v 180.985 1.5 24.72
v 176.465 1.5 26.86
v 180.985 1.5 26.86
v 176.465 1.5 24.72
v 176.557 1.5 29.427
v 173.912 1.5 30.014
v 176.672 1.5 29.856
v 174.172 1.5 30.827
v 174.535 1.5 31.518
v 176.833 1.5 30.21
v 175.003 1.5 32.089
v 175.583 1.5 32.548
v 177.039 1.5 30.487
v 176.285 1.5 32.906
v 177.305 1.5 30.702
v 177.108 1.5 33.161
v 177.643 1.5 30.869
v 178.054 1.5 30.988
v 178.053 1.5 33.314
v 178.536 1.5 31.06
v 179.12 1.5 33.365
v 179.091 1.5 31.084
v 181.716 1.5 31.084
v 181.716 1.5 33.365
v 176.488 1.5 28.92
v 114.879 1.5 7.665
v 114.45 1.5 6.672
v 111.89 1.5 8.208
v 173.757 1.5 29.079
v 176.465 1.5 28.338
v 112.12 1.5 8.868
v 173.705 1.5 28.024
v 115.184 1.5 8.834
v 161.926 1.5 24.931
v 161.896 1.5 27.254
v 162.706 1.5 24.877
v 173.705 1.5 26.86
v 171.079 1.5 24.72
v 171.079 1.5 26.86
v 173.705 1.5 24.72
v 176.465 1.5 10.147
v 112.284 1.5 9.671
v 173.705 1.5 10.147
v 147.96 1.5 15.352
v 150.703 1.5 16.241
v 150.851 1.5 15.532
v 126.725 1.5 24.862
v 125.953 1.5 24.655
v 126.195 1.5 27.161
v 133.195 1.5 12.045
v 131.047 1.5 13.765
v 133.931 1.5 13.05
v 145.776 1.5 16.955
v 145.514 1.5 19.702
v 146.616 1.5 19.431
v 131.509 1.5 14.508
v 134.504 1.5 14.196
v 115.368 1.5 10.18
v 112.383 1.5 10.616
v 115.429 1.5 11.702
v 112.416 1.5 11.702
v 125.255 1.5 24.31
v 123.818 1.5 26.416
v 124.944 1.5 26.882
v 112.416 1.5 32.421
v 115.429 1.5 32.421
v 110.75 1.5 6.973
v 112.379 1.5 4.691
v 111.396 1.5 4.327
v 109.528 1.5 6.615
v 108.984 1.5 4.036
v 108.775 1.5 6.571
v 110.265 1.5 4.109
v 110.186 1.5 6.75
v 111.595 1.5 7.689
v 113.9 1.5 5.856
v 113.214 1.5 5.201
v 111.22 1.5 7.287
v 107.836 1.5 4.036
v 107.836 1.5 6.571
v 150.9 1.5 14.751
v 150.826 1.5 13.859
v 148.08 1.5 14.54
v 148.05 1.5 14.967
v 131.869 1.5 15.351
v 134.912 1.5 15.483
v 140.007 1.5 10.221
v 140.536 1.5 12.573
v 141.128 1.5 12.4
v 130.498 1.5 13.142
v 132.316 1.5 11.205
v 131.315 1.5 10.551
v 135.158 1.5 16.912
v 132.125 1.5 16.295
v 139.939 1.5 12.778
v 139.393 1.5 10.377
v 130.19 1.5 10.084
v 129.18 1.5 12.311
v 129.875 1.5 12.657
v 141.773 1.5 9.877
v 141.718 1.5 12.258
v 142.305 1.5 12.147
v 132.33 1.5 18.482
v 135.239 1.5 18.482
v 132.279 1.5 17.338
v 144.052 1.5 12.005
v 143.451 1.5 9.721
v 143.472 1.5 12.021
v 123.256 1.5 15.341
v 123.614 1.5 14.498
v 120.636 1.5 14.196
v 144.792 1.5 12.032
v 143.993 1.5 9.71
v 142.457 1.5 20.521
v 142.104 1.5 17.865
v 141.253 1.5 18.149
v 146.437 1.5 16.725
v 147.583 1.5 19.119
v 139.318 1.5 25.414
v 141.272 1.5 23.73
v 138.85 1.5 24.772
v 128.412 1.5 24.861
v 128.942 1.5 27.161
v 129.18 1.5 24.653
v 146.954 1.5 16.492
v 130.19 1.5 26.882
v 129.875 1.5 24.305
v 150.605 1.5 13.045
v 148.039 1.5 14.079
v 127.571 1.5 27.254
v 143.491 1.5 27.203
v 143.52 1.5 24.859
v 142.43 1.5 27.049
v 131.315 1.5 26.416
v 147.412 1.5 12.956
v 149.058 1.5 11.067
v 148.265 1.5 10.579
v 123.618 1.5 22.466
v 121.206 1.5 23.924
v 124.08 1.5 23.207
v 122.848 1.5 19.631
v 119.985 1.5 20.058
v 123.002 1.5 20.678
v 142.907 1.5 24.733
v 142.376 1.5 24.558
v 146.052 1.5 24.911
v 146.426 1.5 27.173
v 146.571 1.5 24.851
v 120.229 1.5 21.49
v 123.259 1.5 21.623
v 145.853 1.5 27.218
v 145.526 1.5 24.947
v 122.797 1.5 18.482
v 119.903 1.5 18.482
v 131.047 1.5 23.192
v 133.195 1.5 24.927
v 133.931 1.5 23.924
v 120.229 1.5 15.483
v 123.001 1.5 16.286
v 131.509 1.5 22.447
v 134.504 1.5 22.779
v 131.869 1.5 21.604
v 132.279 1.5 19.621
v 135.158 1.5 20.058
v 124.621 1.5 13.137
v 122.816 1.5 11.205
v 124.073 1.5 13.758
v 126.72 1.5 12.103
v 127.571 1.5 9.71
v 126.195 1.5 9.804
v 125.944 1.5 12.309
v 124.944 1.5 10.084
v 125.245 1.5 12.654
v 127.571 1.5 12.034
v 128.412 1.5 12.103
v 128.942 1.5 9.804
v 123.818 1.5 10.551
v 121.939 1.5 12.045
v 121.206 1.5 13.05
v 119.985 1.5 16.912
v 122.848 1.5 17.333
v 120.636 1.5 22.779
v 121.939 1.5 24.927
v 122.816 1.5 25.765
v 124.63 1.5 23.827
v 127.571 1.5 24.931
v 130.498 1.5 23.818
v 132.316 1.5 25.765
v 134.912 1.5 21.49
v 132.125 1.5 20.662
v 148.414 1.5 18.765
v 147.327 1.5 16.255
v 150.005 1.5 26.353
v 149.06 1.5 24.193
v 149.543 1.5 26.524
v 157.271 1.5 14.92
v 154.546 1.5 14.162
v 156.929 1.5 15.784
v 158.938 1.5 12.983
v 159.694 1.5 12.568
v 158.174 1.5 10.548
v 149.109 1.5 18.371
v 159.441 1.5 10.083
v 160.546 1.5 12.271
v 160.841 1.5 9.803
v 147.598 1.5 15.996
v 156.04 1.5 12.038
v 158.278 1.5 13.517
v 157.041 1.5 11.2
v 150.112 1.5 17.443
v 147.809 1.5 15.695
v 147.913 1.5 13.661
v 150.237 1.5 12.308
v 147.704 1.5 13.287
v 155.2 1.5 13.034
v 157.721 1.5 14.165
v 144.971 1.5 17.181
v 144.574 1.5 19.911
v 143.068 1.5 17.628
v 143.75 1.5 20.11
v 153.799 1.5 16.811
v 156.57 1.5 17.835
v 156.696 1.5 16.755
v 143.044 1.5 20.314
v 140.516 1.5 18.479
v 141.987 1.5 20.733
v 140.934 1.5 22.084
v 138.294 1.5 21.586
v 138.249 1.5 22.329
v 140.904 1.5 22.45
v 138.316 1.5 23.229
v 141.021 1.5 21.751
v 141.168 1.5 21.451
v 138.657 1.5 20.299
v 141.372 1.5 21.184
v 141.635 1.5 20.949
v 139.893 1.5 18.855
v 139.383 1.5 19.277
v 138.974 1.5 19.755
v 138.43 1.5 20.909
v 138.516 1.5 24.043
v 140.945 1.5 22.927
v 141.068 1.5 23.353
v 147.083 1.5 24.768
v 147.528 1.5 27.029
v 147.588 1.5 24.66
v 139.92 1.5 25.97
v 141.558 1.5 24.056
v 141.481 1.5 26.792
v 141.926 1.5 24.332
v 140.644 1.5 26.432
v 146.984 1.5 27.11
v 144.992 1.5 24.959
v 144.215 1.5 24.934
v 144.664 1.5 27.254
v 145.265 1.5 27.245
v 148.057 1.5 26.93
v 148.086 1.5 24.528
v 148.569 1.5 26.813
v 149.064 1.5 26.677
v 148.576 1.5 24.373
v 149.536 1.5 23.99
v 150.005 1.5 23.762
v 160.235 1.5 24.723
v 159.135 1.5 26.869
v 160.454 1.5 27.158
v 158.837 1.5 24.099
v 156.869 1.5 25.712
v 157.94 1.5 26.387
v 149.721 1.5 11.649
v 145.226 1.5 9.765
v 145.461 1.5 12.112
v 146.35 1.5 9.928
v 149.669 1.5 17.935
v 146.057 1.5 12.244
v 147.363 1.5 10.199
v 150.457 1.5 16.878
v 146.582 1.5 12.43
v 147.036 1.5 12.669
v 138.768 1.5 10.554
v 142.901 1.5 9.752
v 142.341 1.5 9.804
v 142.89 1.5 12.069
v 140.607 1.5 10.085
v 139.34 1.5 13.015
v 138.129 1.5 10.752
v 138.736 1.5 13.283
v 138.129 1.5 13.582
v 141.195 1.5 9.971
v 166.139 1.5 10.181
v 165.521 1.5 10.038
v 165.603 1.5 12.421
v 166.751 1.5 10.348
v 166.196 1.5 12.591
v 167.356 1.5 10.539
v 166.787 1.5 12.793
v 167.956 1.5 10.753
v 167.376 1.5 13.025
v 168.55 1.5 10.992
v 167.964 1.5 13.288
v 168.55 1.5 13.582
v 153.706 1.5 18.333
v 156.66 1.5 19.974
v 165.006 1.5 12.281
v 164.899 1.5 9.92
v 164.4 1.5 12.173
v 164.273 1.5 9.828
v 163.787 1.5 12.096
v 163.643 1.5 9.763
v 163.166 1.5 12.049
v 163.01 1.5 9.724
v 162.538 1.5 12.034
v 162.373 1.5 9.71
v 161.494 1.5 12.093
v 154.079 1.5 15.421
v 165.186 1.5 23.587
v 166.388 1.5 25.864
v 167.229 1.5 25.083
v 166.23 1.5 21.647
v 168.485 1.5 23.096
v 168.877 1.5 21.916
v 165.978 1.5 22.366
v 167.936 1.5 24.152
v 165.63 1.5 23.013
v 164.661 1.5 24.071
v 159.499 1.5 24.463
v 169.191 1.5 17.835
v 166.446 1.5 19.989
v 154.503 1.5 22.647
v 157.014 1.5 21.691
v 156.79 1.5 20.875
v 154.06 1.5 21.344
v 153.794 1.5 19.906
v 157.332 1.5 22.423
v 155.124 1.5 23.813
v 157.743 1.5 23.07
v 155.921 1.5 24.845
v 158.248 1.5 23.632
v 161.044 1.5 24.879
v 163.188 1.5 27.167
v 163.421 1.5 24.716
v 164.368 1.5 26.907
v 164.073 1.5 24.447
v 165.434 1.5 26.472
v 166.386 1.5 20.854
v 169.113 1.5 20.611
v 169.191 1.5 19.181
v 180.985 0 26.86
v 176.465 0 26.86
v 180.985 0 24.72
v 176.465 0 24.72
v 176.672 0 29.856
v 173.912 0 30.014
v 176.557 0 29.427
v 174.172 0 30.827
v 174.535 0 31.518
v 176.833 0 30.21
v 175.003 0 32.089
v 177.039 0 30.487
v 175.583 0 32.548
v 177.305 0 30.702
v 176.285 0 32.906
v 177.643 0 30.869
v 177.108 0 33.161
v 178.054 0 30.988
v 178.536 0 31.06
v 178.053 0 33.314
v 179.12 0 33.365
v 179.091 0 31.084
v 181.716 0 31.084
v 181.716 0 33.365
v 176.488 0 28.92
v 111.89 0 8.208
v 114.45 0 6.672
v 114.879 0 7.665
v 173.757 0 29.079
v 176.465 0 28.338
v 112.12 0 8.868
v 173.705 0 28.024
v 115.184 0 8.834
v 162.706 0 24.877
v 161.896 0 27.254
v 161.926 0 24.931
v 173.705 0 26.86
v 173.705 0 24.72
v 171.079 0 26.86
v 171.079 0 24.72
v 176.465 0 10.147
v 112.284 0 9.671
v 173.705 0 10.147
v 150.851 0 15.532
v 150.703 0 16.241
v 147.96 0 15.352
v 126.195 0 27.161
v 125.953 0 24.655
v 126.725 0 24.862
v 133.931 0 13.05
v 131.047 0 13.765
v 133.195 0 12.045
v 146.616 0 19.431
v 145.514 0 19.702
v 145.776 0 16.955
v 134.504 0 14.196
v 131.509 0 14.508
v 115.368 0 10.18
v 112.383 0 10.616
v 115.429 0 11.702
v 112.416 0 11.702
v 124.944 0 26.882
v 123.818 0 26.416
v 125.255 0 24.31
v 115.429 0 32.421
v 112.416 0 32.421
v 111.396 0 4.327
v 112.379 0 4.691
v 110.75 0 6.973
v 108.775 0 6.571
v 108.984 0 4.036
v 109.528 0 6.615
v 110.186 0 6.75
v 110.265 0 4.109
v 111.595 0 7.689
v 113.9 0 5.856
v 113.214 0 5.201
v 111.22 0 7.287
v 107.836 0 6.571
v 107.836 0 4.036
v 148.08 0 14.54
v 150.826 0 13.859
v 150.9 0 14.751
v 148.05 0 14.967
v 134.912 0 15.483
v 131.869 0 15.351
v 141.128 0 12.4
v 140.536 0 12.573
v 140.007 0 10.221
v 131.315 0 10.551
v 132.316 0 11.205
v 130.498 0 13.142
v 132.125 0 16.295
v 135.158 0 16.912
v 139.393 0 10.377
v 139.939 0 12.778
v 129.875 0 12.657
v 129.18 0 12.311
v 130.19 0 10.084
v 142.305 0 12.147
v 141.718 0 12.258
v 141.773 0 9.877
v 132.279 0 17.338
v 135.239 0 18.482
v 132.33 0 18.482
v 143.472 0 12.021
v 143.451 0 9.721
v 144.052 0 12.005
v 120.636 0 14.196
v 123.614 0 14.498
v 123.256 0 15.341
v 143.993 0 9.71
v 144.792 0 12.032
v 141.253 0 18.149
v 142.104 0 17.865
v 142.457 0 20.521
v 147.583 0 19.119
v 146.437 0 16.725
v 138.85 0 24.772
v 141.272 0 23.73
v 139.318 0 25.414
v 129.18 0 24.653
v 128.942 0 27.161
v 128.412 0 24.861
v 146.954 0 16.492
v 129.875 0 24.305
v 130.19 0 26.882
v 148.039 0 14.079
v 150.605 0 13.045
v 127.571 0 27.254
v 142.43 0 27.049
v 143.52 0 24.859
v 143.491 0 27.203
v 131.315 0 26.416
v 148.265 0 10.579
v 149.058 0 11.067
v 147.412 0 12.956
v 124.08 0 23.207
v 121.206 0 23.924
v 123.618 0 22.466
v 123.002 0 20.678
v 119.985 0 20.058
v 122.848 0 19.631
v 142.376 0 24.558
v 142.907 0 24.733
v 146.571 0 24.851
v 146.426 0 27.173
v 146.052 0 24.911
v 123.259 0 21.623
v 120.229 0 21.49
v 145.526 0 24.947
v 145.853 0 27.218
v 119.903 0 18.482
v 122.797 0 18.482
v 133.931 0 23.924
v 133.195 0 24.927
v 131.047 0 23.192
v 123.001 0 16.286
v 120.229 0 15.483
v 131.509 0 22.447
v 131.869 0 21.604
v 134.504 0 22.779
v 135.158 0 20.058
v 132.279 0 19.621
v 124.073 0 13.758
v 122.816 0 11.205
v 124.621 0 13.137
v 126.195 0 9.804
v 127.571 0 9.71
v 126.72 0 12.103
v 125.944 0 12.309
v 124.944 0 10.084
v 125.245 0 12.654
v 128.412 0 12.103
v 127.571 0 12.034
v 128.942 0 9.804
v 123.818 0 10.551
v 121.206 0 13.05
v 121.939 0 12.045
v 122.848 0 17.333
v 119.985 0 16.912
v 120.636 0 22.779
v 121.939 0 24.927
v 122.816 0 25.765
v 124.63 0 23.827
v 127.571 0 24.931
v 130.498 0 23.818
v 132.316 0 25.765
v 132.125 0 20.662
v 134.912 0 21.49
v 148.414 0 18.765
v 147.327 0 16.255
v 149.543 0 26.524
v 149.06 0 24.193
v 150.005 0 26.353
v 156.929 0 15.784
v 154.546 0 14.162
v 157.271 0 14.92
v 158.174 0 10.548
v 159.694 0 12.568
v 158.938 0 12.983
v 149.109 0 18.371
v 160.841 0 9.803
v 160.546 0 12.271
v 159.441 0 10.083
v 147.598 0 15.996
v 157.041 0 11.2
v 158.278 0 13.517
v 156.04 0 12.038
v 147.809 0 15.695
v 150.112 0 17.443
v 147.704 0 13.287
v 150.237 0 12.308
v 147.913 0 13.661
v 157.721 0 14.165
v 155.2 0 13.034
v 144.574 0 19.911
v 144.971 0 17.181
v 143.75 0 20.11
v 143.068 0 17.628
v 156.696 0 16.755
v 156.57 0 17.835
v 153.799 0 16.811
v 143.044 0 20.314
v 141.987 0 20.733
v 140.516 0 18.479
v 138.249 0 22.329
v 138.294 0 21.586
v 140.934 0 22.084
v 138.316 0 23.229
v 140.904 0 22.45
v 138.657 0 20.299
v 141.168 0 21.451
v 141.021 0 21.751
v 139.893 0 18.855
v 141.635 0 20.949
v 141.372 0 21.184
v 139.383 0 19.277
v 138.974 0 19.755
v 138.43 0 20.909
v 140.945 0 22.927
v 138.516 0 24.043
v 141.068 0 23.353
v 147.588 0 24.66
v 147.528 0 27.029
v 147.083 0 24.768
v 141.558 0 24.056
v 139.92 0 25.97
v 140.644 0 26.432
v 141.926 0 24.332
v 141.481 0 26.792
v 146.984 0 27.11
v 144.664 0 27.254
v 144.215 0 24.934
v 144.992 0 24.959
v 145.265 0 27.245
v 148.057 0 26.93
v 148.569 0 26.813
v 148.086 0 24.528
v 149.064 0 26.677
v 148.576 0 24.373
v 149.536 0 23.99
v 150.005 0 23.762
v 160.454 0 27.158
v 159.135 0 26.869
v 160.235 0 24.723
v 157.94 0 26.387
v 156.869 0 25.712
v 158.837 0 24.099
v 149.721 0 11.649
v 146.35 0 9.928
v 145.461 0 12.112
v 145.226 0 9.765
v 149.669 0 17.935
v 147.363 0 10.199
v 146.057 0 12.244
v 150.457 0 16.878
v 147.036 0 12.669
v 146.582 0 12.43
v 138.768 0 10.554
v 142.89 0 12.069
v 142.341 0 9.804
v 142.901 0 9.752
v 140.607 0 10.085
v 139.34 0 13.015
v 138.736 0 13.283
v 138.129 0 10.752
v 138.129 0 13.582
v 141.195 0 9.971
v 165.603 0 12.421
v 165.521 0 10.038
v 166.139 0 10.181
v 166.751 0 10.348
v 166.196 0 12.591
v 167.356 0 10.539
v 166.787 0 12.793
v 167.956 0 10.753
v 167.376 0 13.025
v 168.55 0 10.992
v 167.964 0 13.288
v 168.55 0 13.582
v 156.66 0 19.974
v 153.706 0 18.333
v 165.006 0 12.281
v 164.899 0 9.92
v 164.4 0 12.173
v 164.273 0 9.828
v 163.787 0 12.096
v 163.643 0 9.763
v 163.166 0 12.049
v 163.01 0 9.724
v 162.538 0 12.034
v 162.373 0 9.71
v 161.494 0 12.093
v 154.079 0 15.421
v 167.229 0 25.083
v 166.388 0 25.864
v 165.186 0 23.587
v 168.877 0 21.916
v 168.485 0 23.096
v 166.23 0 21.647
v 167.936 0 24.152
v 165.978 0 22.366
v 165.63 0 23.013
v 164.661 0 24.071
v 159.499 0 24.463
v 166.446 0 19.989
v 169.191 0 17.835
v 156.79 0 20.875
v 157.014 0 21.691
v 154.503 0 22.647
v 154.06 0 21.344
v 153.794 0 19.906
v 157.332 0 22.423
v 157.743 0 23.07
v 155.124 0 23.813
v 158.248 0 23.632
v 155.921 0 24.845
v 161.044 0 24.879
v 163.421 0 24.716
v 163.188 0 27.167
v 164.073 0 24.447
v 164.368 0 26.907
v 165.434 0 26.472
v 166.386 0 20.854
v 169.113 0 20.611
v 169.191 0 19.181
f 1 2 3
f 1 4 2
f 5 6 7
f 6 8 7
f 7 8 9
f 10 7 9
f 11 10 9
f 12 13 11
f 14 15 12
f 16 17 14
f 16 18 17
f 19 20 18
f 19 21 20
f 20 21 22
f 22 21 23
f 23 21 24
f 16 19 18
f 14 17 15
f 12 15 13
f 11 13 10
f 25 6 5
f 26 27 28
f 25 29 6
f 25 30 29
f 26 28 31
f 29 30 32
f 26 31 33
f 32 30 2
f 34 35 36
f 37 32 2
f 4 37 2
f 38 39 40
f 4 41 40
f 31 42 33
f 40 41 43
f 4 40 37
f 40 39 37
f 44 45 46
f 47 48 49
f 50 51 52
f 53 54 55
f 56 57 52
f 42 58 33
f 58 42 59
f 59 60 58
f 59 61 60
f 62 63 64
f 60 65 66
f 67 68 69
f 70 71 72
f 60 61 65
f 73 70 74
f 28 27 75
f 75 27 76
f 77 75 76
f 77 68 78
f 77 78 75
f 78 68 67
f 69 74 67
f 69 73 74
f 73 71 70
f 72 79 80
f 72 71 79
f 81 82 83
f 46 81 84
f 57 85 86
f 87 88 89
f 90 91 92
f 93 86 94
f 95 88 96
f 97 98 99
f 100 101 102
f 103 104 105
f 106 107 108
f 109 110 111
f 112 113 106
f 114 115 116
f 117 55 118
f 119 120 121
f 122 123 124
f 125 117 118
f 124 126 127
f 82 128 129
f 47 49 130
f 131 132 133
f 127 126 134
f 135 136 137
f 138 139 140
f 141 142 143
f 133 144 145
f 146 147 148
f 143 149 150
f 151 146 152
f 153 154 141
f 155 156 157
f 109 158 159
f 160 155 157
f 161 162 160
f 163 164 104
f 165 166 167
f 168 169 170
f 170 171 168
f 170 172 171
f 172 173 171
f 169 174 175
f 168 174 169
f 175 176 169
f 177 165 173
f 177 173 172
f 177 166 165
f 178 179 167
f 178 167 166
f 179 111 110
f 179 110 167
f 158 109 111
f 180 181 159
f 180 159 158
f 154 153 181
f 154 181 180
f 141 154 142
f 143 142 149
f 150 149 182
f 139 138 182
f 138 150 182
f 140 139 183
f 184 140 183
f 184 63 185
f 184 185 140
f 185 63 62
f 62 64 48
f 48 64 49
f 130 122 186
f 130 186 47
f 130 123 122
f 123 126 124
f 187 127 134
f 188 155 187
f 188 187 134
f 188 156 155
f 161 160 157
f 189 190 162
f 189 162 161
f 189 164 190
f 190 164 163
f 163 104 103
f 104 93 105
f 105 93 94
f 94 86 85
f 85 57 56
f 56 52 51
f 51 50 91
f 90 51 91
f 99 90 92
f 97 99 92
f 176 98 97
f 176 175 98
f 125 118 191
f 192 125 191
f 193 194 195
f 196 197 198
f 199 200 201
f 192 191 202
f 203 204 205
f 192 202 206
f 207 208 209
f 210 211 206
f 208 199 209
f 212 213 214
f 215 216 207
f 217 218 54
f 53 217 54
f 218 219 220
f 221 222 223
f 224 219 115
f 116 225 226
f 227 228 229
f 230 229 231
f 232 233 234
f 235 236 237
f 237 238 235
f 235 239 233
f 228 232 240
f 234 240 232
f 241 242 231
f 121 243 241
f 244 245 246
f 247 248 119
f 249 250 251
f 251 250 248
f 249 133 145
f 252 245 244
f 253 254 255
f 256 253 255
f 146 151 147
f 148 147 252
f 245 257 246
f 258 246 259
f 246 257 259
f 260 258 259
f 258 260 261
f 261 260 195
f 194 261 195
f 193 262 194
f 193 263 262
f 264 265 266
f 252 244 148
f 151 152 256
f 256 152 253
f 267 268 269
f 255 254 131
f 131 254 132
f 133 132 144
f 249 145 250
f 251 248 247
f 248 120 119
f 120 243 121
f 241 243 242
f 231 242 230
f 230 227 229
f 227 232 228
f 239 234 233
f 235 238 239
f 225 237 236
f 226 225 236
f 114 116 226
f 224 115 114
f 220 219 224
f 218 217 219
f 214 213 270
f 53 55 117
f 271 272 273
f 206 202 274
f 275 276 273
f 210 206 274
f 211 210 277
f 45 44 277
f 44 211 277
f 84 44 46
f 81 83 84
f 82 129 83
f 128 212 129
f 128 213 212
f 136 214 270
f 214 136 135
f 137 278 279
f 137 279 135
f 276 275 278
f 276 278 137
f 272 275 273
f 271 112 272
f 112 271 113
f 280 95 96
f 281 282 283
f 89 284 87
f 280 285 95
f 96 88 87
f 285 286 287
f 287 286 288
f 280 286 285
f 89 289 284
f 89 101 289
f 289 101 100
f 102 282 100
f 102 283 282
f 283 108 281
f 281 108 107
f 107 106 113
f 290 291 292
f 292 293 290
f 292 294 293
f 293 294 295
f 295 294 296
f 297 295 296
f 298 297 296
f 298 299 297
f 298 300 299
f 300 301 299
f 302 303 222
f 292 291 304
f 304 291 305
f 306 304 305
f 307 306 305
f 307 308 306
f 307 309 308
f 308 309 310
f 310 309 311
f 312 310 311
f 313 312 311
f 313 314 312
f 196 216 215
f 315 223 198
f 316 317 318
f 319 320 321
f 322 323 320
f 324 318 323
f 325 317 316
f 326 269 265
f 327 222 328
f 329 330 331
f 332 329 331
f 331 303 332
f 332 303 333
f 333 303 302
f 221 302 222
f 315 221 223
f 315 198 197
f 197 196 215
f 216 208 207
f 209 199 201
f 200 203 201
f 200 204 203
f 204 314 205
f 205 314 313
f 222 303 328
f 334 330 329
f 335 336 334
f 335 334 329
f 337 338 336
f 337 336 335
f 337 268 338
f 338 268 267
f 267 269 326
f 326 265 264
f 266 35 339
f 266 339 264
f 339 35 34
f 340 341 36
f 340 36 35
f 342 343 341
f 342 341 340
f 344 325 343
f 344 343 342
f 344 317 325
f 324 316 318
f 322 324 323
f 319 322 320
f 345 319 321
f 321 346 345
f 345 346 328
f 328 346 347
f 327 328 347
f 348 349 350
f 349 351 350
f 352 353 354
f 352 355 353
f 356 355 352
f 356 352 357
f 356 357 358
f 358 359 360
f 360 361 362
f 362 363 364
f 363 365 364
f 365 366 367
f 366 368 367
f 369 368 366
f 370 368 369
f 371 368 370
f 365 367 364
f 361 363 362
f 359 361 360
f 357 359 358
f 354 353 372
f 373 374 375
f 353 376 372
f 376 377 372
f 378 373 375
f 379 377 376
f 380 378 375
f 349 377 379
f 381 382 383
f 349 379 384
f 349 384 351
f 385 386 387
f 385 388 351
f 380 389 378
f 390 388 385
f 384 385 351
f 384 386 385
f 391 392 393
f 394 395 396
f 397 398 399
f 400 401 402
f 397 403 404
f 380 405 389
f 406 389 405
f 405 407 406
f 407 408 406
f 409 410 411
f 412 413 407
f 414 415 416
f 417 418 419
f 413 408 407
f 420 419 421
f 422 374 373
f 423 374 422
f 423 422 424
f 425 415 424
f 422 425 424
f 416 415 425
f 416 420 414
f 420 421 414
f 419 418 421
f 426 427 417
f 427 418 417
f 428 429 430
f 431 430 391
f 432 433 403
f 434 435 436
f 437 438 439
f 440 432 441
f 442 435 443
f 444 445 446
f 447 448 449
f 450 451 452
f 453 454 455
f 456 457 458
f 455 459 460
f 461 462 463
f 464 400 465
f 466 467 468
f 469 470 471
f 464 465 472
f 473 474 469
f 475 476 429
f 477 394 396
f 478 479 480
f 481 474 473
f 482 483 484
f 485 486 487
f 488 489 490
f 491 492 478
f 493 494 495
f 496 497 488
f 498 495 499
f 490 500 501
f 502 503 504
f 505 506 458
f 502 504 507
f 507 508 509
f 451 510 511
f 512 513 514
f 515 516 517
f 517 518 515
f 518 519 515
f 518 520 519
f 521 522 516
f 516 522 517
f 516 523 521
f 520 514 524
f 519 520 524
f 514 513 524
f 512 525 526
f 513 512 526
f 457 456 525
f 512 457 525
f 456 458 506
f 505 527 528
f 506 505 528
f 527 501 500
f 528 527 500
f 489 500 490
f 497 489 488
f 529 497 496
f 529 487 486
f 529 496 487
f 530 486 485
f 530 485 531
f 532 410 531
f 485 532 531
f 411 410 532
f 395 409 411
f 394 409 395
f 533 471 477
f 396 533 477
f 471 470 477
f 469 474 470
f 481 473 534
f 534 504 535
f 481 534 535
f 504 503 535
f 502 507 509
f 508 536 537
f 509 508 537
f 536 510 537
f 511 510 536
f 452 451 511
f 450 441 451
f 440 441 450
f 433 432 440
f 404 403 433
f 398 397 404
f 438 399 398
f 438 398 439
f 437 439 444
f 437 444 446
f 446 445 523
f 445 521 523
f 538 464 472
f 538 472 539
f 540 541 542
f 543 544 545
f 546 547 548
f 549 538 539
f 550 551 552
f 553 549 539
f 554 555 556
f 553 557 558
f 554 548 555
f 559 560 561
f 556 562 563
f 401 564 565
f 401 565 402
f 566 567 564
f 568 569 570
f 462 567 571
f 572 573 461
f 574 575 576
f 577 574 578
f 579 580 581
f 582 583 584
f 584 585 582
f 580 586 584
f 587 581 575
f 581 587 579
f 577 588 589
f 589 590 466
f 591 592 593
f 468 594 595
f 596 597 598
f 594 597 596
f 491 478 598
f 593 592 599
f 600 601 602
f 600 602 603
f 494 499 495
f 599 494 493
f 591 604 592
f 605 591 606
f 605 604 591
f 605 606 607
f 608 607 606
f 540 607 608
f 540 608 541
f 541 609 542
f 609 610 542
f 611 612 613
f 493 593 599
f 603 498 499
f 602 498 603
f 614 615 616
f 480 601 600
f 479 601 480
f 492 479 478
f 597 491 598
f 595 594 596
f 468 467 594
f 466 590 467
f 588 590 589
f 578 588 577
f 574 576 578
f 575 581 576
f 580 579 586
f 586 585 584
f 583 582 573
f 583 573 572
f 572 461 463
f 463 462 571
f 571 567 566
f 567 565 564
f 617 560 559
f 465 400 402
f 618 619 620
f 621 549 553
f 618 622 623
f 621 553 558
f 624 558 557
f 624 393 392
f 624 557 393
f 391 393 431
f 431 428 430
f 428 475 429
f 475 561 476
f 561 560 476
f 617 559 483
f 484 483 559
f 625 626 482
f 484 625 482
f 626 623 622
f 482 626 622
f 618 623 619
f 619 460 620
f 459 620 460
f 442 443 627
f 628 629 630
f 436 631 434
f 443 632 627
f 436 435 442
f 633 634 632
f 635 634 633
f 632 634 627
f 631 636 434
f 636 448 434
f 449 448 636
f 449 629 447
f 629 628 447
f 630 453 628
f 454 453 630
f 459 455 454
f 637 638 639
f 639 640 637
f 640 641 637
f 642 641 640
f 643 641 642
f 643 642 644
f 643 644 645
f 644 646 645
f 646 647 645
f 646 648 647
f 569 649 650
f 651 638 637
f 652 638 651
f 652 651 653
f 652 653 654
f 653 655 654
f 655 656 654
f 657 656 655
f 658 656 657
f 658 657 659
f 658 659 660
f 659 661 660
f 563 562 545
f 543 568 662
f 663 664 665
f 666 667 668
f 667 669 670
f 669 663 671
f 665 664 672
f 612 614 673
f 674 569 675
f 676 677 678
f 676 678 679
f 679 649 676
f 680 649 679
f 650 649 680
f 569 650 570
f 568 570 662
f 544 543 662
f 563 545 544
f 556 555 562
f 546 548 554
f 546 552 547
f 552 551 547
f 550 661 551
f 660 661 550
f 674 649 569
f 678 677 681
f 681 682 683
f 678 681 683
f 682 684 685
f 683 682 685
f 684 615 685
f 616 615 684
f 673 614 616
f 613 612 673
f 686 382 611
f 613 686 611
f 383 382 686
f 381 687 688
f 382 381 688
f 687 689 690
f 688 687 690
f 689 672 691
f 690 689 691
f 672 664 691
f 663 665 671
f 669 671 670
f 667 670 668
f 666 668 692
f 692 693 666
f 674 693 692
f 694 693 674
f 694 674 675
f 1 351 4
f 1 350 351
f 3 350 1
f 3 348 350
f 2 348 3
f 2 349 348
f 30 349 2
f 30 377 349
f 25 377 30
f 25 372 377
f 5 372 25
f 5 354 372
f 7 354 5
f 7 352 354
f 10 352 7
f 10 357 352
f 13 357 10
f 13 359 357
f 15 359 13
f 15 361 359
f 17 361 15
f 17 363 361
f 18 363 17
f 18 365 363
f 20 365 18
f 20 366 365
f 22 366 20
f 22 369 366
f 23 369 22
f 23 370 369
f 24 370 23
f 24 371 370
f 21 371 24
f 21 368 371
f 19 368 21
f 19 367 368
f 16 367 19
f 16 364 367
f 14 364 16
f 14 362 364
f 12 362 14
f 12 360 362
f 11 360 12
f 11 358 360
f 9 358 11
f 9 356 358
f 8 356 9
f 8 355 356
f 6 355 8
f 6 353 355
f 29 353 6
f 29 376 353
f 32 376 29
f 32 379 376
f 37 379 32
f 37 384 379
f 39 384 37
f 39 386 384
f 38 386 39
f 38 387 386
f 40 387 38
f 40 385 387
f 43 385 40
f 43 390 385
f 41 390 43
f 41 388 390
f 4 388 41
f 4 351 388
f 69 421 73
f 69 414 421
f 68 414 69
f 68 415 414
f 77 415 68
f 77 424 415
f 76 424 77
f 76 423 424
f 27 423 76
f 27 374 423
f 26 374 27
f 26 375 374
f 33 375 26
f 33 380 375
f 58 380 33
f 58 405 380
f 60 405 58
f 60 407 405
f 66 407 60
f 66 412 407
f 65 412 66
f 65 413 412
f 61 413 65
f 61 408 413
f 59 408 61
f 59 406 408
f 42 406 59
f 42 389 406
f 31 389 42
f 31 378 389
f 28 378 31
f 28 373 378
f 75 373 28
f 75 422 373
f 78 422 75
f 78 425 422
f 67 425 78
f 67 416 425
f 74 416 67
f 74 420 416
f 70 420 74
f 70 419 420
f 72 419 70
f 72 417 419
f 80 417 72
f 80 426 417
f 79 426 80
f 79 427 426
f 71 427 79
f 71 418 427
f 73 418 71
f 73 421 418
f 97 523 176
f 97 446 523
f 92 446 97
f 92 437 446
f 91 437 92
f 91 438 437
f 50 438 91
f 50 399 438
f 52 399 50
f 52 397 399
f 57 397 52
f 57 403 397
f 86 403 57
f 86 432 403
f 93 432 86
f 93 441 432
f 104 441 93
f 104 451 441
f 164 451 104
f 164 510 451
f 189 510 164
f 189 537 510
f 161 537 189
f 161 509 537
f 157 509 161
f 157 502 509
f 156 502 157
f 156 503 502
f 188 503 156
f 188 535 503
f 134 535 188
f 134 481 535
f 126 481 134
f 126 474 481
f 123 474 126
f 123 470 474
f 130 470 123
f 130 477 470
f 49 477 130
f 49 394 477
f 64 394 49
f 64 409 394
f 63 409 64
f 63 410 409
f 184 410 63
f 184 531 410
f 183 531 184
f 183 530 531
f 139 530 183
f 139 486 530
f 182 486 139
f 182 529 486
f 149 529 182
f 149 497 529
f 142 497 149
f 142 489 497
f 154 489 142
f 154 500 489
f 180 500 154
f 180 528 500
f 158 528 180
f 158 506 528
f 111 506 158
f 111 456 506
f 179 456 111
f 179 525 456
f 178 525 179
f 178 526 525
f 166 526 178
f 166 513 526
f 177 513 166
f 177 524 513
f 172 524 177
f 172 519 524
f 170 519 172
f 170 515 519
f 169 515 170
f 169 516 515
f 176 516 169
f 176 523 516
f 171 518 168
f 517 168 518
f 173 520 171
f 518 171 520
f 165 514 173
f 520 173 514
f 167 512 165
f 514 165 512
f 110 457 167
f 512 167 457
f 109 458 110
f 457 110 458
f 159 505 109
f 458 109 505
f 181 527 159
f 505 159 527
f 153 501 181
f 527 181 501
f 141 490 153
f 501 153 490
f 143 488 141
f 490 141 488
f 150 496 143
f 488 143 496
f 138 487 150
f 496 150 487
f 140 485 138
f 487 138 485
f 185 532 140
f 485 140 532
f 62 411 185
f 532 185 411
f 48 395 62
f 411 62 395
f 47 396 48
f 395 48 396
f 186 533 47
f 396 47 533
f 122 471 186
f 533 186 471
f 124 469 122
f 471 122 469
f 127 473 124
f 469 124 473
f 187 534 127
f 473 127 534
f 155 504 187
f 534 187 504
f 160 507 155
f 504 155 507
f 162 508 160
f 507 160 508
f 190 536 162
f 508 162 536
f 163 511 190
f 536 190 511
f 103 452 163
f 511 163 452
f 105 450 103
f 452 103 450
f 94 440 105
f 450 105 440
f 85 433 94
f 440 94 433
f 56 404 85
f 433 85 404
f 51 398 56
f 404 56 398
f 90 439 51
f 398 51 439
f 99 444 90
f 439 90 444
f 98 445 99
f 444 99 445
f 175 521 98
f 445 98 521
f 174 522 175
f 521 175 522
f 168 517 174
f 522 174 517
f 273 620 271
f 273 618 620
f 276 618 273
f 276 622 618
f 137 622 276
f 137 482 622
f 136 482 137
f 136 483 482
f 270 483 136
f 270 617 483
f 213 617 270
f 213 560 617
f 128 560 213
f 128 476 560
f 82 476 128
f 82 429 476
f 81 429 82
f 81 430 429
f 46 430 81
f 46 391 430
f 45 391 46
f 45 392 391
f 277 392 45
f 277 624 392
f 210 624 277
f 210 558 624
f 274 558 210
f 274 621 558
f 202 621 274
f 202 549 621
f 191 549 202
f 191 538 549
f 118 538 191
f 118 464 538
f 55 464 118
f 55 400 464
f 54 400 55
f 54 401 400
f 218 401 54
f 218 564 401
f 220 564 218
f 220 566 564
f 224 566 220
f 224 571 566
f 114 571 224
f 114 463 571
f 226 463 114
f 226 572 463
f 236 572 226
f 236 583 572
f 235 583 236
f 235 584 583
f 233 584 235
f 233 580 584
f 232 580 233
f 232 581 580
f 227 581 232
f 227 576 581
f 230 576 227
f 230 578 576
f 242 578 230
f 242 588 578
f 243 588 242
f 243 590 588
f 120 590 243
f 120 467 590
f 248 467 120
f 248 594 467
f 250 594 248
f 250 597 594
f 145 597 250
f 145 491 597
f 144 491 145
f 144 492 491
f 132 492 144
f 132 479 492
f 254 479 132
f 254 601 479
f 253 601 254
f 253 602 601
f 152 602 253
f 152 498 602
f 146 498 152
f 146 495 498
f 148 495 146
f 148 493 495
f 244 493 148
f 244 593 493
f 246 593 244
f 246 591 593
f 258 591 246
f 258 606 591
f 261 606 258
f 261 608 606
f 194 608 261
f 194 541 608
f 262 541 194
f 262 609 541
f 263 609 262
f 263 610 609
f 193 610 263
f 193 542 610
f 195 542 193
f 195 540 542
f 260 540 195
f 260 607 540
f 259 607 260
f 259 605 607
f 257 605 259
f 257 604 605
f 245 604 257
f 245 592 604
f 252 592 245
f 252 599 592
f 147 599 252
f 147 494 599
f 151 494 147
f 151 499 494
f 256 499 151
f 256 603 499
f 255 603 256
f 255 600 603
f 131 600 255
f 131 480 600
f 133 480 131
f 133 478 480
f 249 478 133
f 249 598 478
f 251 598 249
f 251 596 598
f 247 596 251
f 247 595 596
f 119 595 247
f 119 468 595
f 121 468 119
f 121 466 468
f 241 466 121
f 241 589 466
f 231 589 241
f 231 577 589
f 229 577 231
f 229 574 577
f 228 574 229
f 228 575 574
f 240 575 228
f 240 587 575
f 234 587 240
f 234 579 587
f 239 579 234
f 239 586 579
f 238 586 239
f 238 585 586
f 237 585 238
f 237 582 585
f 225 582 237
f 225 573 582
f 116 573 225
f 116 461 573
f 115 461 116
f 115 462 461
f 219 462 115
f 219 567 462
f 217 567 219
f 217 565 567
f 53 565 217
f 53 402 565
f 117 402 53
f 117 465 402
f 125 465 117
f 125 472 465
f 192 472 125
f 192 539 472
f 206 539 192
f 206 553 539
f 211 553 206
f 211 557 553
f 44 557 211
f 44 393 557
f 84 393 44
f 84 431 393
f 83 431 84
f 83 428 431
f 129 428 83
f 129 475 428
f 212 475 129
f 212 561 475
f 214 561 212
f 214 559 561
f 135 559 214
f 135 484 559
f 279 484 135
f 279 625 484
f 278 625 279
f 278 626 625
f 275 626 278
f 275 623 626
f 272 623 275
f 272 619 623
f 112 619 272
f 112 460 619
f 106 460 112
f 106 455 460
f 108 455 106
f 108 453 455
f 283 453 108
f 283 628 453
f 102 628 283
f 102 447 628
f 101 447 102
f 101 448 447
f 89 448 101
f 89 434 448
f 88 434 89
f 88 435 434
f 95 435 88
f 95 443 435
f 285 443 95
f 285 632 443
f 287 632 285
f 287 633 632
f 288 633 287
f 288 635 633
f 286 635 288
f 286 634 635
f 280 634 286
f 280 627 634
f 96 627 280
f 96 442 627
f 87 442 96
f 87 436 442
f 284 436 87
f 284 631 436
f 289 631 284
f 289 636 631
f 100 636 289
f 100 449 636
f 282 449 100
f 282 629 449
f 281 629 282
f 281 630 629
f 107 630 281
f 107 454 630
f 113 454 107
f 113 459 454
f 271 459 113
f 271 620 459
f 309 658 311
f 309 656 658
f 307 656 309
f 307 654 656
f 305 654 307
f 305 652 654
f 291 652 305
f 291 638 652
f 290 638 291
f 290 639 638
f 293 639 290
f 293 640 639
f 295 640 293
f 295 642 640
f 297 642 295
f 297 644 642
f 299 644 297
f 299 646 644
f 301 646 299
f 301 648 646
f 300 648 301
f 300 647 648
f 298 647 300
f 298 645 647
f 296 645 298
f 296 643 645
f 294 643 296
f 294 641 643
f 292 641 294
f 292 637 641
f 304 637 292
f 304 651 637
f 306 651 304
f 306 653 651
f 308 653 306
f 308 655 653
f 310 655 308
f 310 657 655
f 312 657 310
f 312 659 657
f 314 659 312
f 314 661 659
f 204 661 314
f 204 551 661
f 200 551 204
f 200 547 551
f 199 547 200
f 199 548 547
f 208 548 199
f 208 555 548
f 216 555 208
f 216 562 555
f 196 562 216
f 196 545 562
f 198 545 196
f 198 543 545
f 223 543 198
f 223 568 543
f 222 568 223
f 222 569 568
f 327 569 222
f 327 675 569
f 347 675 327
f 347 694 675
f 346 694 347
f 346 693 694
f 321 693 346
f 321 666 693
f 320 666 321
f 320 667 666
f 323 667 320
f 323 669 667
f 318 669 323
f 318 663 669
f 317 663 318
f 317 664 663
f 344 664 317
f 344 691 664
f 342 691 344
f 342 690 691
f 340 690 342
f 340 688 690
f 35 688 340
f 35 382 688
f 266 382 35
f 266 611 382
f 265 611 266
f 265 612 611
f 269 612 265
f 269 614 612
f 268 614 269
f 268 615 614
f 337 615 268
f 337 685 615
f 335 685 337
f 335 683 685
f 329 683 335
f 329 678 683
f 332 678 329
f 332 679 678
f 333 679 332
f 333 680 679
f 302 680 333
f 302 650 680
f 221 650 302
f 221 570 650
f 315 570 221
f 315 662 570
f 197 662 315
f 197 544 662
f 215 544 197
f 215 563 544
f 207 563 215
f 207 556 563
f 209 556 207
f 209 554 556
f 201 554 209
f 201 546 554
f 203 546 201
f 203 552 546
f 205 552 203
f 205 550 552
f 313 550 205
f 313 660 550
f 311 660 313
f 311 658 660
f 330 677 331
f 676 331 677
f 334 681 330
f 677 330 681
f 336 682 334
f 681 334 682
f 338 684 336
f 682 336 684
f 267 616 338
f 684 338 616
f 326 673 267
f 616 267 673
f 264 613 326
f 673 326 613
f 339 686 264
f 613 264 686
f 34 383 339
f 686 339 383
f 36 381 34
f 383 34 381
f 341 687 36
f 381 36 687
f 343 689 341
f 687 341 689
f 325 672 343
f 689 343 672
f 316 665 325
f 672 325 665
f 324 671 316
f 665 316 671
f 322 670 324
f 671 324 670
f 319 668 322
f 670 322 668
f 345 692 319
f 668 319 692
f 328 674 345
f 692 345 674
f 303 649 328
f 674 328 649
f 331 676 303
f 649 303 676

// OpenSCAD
// PrimeBind Cap — Josef name inlay (WHITE filament)
// Import alongside cap_josef_black.stl in Creality Print as multicolor

binder_w   = 264.7;
fit_gap    = 2.0;
side_wall  = 12.0;
inner_w    = binder_w + fit_gap;
outer_w    = inner_w + 2*side_wall;
cap_h      = 45;

name_text  = "Josef";
name_size  = 22;
name_font  = "Bunken Tech Sans Pro ExBd:style=Italic";
name_depth = 1.5;

$fn = 32;

translate([outer_w/2 - 0.2, name_depth, cap_h/2 - 4])
    rotate([90, 0, 0])
        linear_extrude(height = name_depth)
            text(name_text, size = name_size, font = name_font,
                 halign = "center", valign = "center");
